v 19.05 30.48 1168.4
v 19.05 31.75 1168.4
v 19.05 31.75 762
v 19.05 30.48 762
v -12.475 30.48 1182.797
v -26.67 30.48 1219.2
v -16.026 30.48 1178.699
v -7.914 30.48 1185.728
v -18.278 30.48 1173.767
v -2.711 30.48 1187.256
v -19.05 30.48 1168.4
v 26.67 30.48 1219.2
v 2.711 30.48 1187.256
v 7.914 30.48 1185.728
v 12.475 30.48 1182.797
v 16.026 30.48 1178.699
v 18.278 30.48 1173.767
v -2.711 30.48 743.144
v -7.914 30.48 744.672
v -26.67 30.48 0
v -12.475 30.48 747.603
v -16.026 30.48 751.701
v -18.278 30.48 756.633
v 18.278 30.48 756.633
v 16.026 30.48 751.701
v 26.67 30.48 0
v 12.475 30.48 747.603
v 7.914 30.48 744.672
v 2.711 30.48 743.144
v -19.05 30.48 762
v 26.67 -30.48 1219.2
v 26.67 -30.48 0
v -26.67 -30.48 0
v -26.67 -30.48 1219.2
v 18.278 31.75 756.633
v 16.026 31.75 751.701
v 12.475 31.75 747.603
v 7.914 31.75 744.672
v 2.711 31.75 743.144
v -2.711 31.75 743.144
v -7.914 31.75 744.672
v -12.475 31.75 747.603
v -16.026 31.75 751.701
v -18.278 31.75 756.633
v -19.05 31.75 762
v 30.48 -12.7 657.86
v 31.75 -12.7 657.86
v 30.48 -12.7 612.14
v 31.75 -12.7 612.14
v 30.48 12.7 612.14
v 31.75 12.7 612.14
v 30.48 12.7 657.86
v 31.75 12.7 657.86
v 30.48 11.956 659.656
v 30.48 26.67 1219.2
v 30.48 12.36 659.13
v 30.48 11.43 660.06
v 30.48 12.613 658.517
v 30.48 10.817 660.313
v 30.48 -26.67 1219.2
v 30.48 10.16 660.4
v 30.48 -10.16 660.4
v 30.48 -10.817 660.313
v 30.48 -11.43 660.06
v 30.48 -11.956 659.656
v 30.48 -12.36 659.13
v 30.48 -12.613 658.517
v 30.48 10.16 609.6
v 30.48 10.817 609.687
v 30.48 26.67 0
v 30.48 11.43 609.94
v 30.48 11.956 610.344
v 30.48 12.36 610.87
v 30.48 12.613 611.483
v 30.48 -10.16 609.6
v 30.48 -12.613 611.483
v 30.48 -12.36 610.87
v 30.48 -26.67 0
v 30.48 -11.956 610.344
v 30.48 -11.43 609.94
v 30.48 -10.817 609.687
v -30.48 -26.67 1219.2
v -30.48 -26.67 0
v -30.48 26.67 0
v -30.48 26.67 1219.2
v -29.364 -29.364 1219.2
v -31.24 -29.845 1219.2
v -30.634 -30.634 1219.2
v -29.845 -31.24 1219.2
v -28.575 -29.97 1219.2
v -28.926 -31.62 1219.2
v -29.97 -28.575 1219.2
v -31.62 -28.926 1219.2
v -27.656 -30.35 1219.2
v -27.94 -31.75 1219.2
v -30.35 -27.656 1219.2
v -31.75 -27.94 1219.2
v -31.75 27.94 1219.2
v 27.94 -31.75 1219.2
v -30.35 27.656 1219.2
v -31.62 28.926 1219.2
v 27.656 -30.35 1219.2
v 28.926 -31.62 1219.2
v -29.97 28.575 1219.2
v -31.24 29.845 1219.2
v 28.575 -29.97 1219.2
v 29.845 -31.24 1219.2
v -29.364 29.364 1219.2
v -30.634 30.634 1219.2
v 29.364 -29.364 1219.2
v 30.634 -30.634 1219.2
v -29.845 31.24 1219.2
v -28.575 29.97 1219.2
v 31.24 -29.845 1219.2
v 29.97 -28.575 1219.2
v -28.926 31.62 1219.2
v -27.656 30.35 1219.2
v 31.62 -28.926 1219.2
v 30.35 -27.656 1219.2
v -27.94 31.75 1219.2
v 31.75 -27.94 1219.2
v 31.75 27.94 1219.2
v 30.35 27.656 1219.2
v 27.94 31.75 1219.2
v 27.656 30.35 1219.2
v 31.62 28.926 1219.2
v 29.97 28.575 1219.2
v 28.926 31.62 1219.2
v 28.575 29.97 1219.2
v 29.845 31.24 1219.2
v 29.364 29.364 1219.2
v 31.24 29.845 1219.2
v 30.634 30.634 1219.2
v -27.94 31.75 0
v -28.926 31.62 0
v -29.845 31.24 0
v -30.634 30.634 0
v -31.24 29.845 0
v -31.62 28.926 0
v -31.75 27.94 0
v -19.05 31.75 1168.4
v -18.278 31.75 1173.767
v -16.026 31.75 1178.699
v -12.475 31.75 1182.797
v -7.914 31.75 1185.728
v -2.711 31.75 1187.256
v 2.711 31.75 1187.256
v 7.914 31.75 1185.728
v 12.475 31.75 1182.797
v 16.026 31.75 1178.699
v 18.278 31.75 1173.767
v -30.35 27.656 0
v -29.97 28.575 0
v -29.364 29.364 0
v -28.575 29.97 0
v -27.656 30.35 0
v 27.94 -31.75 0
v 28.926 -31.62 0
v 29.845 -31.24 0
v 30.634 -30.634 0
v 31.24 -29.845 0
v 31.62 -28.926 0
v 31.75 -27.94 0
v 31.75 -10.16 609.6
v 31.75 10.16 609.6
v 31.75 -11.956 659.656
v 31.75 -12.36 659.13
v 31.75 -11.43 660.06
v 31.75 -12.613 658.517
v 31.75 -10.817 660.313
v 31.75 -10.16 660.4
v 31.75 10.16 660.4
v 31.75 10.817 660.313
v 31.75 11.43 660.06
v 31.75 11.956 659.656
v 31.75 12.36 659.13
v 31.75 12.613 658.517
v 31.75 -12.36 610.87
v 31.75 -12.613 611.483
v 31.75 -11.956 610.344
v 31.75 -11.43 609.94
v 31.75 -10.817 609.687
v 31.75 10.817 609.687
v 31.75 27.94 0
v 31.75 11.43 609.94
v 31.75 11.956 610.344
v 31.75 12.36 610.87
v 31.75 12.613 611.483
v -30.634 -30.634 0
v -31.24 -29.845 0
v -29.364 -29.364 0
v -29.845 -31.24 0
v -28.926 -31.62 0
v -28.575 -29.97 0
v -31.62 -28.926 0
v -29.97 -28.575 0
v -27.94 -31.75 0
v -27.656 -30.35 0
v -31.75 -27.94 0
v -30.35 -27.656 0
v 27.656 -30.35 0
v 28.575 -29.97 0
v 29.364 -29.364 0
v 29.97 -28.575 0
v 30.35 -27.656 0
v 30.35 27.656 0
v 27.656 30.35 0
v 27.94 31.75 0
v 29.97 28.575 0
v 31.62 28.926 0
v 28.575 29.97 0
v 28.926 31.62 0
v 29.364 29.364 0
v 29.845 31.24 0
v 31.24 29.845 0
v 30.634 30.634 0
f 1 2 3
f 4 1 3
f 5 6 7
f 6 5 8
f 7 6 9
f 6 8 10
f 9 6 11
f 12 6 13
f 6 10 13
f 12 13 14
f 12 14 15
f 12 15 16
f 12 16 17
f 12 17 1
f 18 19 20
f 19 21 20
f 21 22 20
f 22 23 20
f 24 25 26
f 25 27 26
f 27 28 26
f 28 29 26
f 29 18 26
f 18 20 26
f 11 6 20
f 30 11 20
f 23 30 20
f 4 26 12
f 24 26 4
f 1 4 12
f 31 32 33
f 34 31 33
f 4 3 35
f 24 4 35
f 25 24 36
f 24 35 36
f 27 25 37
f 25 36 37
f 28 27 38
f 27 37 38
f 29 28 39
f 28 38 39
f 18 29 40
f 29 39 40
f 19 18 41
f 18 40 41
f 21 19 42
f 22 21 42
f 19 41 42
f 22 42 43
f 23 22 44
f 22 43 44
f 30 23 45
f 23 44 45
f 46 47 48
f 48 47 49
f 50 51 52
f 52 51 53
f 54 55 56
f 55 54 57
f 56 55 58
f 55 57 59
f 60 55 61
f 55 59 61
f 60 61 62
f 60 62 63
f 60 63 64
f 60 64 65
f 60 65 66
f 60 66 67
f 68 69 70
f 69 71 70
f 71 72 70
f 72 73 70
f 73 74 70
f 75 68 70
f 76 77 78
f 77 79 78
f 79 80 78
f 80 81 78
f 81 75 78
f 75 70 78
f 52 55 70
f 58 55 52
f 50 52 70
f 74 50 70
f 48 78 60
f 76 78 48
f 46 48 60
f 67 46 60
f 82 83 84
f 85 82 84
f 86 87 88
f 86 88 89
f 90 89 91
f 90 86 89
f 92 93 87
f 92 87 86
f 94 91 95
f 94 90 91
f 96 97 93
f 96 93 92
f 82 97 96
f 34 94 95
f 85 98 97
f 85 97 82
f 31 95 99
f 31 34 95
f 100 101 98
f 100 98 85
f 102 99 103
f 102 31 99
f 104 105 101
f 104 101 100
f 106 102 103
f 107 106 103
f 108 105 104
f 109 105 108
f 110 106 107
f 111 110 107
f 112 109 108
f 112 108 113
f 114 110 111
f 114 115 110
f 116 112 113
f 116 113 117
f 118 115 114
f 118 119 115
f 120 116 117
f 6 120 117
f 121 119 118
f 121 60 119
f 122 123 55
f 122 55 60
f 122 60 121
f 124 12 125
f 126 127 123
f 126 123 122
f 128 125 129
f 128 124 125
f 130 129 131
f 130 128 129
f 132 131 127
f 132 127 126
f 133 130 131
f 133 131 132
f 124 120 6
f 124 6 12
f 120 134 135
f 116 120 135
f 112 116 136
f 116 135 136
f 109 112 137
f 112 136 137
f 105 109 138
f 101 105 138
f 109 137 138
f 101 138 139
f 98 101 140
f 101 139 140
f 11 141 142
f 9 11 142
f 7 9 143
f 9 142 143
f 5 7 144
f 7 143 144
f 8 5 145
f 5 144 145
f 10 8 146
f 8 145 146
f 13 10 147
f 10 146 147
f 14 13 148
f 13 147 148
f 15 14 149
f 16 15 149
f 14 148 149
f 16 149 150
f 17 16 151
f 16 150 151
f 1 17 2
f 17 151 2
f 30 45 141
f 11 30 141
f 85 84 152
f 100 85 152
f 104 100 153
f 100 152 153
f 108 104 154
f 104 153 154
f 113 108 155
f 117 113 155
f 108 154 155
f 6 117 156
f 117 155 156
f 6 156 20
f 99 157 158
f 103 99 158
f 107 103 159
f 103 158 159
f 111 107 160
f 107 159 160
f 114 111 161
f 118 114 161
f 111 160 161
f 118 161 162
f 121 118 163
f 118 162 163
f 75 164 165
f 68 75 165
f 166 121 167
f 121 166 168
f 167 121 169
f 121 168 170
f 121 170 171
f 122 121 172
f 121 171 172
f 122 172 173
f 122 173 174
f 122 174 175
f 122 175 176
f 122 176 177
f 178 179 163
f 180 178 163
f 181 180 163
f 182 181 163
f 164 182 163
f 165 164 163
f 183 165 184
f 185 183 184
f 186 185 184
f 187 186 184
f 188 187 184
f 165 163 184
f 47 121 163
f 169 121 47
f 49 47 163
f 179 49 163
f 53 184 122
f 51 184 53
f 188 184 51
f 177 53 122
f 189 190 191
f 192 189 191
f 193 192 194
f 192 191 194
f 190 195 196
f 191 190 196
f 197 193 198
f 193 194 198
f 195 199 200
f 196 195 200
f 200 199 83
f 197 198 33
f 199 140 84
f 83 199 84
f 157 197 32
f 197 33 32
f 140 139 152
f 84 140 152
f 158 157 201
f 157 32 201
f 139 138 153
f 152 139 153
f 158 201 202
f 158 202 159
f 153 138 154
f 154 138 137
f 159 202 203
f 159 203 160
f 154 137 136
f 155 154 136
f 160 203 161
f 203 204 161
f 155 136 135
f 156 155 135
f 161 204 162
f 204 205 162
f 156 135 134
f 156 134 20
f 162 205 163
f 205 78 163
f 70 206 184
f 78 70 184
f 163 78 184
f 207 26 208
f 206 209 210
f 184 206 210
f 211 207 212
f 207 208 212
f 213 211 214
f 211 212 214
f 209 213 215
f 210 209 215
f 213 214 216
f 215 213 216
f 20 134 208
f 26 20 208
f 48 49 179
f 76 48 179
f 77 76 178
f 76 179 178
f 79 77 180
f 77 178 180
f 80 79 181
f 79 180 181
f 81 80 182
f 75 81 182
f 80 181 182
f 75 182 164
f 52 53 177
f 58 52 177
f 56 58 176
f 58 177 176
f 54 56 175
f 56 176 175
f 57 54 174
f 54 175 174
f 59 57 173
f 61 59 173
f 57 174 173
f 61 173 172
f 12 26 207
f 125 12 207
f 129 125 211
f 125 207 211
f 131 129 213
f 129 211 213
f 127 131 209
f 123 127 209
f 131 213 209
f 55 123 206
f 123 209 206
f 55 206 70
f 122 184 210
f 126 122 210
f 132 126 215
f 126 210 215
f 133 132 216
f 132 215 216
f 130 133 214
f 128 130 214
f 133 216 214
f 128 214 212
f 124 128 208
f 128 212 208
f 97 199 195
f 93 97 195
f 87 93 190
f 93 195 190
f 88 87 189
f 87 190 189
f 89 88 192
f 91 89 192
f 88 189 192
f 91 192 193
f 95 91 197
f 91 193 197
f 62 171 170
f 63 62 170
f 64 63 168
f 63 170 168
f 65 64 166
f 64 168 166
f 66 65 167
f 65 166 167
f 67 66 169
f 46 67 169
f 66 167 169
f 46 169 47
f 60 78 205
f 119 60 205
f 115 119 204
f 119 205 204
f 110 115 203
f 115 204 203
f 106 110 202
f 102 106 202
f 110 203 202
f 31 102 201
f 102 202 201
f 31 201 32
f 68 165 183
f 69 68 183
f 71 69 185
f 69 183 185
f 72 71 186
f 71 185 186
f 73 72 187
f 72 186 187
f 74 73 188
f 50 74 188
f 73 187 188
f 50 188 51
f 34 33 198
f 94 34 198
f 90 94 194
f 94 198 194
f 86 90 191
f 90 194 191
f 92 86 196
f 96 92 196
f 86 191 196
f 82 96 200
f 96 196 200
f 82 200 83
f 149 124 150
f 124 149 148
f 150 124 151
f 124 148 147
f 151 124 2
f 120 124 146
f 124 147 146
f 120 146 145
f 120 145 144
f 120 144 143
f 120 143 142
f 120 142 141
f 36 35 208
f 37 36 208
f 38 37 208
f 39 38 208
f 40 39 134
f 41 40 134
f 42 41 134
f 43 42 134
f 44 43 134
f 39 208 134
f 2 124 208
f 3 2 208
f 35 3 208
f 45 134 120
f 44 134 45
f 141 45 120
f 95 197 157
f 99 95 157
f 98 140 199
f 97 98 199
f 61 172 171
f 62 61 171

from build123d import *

# Parameters (mm, degrees)
F1_DEPTH = 1219.2
F3_DEPTH = 1.27
F5_DEPTH = 1.27


with BuildPart() as f1:
    # F0 (on Top) → F1 (new body)
    with BuildSketch(Plane.XY):
        with BuildLine():
            ThreePointArc((31.75, 27.94), (30.634077, 30.634077), (27.94, 31.75))
            Line((27.94, 31.75), (-27.94, 31.75))
            ThreePointArc((-27.94, 31.75), (-30.634077, 30.634077), (-31.75, 27.94))
            Line((-31.75, 27.94), (-31.75, -27.94))
            ThreePointArc((-31.75, -27.94), (-30.634077, -30.634077), (-27.94, -31.75))
            Line((-27.94, -31.75), (27.94, -31.75))
            ThreePointArc((27.94, -31.75), (30.634077, -30.634077), (31.75, -27.94))
            Line((31.75, -27.94), (31.75, 27.94))
        make_face()
        with BuildLine():
            Line((-26.67, 30.48), (26.67, 30.48))
            ThreePointArc((26.67, 30.48), (29.364077, 29.364077), (30.48, 26.67))
            Line((30.48, 26.67), (30.48, -26.67))
            ThreePointArc((30.48, -26.67), (29.364077, -29.364077), (26.67, -30.48))
            Line((26.67, -30.48), (-26.67, -30.48))
            ThreePointArc((-26.67, -30.48), (-29.364077, -29.364077), (-30.48, -26.67))
            Line((-30.48, -26.67), (-30.48, 26.67))
            ThreePointArc((-30.48, 26.67), (-29.364077, 29.364077), (-26.67, 30.48))
        make_face(mode=Mode.SUBTRACT)
    extrude(amount=F1_DEPTH)

    # F2 (on face) → F3 (cut, through all)
    with BuildSketch(Plane(origin=(0, 31.75, 0), x_dir=(-1, 0, 0), z_dir=(0, 1, 0))):
        with BuildLine():
            ThreePointArc((19.05, 1168.4), (0, 1187.45), (-19.05, 1168.4))
            Line((-19.05, 1168.4), (-19.05, 762))
            ThreePointArc((-19.05, 762), (0, 742.95), (19.05, 762))
            Line((19.05, 762), (19.05, 1168.4))
        make_face()
    extrude(amount=-F3_DEPTH, mode=Mode.SUBTRACT)

    # F4 (on face) → F5 (cut, through all)
    with BuildSketch(Plane.YZ.offset(31.75)):
        with BuildLine():
            ThreePointArc((12.7, 657.86), (11.956051, 659.656051), (10.16, 660.4))
            Line((10.16, 660.4), (-10.16, 660.4))
            ThreePointArc((-10.16, 660.4), (-11.956051, 659.656051), (-12.7, 657.86))
            Line((-12.7, 657.86), (-12.7, 612.14))
            ThreePointArc((-12.7, 612.14), (-11.956051, 610.343949), (-10.16, 609.6))
            Line((-10.16, 609.6), (10.16, 609.6))
            ThreePointArc((10.16, 609.6), (11.956051, 610.343949), (12.7, 612.14))
            Line((12.7, 612.14), (12.7, 657.86))
        make_face()
    extrude(amount=-F5_DEPTH, mode=Mode.SUBTRACT)


solid = f1.part
